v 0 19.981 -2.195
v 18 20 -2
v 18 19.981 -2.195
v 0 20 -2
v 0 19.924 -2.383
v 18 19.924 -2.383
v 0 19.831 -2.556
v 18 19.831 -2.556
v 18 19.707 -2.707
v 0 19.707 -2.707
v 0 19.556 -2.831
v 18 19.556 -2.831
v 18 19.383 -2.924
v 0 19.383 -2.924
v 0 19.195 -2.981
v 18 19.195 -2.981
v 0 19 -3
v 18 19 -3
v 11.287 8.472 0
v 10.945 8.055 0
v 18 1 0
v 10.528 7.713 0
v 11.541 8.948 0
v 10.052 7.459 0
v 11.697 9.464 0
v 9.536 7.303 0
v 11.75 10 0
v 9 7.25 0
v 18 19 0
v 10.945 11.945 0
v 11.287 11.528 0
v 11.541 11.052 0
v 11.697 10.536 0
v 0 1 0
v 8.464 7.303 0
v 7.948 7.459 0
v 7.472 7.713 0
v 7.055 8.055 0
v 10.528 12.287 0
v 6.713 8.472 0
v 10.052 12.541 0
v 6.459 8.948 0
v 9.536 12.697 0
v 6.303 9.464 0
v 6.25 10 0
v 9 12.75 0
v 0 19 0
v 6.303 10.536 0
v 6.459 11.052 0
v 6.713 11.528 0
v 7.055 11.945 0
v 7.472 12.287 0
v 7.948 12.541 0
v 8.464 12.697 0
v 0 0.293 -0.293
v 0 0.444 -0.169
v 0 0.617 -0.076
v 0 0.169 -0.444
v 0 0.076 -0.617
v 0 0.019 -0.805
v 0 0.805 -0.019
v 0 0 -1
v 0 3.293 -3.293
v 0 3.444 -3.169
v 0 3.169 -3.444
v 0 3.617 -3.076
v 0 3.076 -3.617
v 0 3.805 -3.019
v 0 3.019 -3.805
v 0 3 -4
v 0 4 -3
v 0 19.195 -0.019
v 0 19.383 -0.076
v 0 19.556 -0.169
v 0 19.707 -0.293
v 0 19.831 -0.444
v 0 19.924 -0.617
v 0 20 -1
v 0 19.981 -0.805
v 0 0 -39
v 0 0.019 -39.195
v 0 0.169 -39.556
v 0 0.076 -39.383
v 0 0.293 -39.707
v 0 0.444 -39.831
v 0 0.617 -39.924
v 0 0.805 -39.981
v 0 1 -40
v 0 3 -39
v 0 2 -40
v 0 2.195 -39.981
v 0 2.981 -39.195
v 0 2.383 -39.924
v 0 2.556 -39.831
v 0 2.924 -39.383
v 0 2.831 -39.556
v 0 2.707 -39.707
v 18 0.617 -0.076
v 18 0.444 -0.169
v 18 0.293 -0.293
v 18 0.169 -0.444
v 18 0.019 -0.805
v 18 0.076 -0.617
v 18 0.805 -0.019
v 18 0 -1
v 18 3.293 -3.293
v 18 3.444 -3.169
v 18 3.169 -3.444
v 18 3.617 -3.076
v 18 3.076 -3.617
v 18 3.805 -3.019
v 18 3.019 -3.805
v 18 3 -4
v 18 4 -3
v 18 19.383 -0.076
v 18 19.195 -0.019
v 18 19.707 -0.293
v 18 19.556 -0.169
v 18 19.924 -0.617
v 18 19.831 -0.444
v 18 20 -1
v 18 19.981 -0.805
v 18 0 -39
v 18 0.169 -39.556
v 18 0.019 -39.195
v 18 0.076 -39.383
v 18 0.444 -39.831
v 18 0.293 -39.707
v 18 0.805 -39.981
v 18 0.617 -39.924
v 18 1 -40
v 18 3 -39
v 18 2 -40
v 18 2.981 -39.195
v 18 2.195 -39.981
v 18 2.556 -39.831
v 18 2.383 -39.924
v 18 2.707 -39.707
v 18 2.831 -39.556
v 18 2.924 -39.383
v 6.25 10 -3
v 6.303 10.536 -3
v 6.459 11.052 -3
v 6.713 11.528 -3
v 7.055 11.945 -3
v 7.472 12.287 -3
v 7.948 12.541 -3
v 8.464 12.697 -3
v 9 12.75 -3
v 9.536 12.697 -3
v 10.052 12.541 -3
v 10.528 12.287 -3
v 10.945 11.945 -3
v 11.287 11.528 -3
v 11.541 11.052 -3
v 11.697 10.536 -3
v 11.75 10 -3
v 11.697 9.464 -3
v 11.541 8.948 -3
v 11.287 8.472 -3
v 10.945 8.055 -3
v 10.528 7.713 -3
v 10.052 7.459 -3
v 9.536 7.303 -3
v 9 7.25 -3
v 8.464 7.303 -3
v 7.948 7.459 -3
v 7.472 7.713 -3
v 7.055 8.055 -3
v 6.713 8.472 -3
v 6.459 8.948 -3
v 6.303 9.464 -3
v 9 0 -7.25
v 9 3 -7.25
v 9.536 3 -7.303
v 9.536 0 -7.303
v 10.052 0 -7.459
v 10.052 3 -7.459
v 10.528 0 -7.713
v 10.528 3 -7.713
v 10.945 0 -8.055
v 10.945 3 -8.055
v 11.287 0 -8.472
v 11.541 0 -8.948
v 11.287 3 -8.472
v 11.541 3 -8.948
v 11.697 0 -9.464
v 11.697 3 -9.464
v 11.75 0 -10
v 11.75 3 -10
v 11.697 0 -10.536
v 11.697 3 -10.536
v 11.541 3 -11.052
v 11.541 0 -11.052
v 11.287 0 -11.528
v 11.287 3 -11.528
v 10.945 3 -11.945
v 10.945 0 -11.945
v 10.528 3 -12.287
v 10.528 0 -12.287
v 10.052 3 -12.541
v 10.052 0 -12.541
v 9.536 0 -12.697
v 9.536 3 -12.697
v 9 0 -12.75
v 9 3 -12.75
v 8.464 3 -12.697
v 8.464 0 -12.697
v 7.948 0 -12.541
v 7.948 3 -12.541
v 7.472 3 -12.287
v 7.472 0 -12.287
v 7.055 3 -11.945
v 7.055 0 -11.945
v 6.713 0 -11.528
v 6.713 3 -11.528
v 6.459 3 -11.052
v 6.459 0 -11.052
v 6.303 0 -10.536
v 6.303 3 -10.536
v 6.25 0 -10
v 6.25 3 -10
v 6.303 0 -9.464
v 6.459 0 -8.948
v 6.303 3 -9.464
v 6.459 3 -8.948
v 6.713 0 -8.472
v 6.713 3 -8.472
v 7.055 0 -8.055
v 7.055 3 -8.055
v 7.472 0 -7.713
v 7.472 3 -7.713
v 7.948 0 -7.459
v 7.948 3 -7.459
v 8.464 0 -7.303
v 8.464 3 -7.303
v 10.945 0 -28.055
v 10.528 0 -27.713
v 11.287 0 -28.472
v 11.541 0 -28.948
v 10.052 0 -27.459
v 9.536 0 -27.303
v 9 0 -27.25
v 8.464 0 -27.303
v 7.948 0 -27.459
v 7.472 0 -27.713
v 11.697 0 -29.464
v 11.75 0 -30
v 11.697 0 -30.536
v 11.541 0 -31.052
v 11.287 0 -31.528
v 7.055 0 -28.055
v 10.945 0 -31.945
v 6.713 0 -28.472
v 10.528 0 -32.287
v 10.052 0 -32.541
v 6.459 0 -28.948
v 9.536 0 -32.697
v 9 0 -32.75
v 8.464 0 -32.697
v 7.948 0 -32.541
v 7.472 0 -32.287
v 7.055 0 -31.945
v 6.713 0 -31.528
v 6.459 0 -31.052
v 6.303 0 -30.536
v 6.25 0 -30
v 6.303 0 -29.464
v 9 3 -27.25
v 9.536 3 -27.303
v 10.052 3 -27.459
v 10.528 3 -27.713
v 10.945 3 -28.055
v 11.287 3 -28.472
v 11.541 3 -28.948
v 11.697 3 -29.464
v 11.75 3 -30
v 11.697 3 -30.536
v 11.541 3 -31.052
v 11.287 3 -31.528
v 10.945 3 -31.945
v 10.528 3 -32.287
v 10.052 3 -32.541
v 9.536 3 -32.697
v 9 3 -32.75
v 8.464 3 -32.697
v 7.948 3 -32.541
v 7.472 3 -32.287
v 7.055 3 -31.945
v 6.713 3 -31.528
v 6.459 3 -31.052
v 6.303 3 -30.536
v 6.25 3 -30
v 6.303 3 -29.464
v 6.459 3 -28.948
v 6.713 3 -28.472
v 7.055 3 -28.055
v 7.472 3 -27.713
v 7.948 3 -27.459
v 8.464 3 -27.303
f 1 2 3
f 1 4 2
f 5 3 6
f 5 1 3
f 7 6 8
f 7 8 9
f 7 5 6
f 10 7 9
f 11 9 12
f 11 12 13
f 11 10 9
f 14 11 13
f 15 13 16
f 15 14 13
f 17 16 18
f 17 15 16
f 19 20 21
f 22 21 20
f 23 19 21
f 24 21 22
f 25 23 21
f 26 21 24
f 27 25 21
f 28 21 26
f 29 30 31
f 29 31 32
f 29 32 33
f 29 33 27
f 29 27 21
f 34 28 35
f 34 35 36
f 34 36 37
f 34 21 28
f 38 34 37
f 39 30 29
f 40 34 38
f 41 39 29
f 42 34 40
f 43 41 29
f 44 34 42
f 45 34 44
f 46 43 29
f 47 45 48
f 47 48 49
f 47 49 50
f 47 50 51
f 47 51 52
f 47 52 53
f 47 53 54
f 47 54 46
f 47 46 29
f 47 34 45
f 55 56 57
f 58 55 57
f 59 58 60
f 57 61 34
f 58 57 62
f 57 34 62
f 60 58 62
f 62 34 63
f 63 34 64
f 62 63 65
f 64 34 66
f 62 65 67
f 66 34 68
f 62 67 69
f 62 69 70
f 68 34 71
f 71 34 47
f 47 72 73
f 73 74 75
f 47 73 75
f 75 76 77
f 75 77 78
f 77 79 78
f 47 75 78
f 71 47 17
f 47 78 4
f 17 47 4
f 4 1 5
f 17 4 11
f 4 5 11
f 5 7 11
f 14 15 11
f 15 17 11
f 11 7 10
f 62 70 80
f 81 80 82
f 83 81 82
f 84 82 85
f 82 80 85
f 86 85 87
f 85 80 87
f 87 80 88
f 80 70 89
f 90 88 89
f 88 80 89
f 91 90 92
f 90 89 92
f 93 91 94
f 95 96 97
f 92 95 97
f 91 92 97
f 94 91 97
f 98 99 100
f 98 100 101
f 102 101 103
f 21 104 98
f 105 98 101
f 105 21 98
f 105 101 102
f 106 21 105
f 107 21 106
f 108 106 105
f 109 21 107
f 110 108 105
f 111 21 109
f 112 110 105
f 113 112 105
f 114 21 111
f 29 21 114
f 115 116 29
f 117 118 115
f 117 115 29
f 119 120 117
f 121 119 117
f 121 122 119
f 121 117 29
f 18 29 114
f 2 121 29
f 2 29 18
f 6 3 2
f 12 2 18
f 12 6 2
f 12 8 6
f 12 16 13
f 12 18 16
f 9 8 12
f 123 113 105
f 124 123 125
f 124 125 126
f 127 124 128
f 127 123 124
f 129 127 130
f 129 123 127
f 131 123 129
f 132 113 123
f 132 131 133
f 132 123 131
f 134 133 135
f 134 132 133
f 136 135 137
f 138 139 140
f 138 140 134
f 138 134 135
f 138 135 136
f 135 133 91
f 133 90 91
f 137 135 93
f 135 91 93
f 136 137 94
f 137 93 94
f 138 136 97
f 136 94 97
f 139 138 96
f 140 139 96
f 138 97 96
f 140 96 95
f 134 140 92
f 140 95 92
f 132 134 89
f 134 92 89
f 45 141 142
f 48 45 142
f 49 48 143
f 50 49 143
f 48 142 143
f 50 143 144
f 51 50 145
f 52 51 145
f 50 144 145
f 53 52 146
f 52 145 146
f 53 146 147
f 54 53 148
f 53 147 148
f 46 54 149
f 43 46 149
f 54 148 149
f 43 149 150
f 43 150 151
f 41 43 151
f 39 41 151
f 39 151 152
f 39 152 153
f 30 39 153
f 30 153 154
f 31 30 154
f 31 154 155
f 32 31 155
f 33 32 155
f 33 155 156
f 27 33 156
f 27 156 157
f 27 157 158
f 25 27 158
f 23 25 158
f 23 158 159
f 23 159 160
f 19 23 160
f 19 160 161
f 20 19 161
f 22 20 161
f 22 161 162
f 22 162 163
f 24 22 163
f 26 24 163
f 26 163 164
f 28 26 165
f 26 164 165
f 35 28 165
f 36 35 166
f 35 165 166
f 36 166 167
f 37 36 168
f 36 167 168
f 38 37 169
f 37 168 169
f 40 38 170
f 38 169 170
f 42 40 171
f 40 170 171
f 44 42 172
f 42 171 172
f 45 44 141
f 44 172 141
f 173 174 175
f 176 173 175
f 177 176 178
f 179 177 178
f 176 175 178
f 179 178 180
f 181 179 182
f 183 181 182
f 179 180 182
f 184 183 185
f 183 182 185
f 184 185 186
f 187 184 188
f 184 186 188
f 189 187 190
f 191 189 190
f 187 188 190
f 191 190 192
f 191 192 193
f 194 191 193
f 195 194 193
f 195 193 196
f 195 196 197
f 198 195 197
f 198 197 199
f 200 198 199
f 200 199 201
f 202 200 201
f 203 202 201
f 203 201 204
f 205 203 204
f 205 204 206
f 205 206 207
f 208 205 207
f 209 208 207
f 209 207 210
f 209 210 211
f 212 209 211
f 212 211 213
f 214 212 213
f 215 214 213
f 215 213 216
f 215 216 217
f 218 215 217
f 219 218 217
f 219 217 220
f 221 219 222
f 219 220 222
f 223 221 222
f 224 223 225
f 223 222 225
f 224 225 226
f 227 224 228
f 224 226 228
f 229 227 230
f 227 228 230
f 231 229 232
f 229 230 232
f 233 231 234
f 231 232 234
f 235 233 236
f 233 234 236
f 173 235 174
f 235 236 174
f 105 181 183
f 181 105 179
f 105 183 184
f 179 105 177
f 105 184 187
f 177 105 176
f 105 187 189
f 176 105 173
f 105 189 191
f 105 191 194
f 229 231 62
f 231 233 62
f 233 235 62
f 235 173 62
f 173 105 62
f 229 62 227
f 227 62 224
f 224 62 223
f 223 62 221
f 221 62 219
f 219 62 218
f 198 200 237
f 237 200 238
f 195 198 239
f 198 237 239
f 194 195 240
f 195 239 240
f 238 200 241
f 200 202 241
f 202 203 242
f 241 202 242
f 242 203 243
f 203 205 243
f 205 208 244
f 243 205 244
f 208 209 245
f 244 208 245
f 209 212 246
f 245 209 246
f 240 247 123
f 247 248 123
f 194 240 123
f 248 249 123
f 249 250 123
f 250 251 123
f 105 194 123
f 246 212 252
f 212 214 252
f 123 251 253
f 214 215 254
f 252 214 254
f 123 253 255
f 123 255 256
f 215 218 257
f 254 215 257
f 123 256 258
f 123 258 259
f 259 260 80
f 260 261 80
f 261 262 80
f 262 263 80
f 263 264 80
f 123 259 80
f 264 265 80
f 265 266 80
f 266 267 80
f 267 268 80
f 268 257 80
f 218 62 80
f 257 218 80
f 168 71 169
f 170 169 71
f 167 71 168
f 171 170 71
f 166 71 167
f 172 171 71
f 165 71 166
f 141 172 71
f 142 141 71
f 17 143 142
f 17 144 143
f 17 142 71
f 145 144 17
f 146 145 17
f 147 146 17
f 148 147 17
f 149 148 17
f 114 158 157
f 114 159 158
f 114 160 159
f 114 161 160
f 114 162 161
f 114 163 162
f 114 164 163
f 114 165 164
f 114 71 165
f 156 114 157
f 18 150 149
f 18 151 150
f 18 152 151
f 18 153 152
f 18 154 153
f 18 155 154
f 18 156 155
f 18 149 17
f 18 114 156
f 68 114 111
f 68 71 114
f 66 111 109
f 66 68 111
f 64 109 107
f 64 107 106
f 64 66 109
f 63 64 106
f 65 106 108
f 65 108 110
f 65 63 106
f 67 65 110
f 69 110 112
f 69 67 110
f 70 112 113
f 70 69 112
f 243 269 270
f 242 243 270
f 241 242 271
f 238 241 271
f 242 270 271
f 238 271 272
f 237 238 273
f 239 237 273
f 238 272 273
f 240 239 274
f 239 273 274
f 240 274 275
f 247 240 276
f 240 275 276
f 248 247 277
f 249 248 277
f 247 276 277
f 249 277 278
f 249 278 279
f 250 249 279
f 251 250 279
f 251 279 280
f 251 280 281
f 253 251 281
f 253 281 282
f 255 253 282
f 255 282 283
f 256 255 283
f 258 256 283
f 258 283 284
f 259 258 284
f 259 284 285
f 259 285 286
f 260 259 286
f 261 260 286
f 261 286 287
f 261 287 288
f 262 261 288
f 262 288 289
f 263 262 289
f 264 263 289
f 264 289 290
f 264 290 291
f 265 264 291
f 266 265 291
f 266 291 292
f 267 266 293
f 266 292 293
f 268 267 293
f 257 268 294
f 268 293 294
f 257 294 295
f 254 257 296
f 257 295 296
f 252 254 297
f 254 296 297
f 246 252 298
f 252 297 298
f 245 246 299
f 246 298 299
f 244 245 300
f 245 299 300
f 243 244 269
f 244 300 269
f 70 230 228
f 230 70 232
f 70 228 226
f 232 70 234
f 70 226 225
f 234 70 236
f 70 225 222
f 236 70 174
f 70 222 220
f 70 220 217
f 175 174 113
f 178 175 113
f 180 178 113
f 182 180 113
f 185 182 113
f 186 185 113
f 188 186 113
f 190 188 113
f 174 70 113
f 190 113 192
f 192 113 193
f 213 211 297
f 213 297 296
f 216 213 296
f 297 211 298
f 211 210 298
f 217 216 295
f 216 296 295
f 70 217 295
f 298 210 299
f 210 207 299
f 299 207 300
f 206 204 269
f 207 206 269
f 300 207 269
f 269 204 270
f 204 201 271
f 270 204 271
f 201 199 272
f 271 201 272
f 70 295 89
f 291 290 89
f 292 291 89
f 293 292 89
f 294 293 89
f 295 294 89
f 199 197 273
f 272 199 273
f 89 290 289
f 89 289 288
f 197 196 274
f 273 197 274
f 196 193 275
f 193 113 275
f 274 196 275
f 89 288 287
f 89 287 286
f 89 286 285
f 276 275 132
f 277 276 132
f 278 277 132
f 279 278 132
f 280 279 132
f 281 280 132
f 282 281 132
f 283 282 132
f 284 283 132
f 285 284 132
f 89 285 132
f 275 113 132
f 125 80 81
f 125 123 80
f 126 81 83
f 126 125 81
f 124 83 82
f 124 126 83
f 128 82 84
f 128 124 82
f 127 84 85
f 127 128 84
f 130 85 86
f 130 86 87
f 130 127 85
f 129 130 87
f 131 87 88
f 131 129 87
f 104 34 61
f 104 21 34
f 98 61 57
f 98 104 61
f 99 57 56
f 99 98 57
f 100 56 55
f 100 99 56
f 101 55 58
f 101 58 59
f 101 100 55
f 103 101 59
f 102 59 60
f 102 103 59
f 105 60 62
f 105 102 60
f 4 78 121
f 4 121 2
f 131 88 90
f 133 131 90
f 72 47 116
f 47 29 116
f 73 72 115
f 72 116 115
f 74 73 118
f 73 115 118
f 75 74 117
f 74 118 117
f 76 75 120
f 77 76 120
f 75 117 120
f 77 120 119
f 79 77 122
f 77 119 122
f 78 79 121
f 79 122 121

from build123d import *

# Parameters (mm, degrees)
SKETCH_1_W          = 40
SKETCH_1_H          = 20
EXTRUDE_1_DEPTH     = 18
SKETCH_2_W          = 37
SKETCH_2_H          = 17
CUT_EXTRUDE_1_DEPTH = 18
SKETCH_3_R          = 2.75
CUT_EXTRUDE_2_DEPTH = 18
SKETCH_4_R          = 2.75
CUT_EXTRUDE_3_DEPTH = 18
FILLET_1_R          = 1


with BuildPart() as part:
    # 草图1 → 凸台-拉伸1 (new body)
    with BuildSketch(Plane(origin=(0, 0, 0), x_dir=(0, 0, -1), z_dir=(1, 0, 0))):
        with Locations((20, 10)):
            Rectangle(SKETCH_1_W, SKETCH_1_H)
    extrude(amount=EXTRUDE_1_DEPTH)

    # 草图2 → 切除-拉伸1 (cut)
    with BuildSketch(Plane(origin=(18, 0, 0), x_dir=(0, 0, -1), z_dir=(1, 0, 0))):
        with Locations((21.5, 11.5)):
            Rectangle(SKETCH_2_W, SKETCH_2_H)
    extrude(amount=-CUT_EXTRUDE_1_DEPTH, mode=Mode.SUBTRACT)

    # 草图3 → 切除-拉伸2 (cut)
    with BuildSketch(Plane(origin=(0, 0, -3), x_dir=(-1, 0, 0), z_dir=(0, 0, -1))):
        with Locations((-9, 10)):
            Circle(SKETCH_3_R)
    extrude(amount=-CUT_EXTRUDE_2_DEPTH, mode=Mode.SUBTRACT)

    # 草图4 → 切除-拉伸3 (cut)
    with BuildSketch(Plane(origin=(0, 3, 0), x_dir=(1, 0, 0), z_dir=(0, 1, 0))):
        with Locations(Location((9, 30, 0), (0, 0, 270))):
            Circle(SKETCH_4_R)
        with Locations(Location((9, 10, 0), (0, 0, 270))):
            Circle(SKETCH_4_R)
    extrude(amount=-CUT_EXTRUDE_3_DEPTH, mode=Mode.SUBTRACT)

    # 圆角1
    fillet_1_edges = [part.edges().sort_by_distance(p)[0] for p in [
        (9, 20, -3),
        (9, 3, -40),
        (9, 3, -3),
        (9, 20, 0),
        (9, 0, -40),
        (9, 0, 0),
    ]]
    fillet(fillet_1_edges, radius=FILLET_1_R)


solid = part.part
